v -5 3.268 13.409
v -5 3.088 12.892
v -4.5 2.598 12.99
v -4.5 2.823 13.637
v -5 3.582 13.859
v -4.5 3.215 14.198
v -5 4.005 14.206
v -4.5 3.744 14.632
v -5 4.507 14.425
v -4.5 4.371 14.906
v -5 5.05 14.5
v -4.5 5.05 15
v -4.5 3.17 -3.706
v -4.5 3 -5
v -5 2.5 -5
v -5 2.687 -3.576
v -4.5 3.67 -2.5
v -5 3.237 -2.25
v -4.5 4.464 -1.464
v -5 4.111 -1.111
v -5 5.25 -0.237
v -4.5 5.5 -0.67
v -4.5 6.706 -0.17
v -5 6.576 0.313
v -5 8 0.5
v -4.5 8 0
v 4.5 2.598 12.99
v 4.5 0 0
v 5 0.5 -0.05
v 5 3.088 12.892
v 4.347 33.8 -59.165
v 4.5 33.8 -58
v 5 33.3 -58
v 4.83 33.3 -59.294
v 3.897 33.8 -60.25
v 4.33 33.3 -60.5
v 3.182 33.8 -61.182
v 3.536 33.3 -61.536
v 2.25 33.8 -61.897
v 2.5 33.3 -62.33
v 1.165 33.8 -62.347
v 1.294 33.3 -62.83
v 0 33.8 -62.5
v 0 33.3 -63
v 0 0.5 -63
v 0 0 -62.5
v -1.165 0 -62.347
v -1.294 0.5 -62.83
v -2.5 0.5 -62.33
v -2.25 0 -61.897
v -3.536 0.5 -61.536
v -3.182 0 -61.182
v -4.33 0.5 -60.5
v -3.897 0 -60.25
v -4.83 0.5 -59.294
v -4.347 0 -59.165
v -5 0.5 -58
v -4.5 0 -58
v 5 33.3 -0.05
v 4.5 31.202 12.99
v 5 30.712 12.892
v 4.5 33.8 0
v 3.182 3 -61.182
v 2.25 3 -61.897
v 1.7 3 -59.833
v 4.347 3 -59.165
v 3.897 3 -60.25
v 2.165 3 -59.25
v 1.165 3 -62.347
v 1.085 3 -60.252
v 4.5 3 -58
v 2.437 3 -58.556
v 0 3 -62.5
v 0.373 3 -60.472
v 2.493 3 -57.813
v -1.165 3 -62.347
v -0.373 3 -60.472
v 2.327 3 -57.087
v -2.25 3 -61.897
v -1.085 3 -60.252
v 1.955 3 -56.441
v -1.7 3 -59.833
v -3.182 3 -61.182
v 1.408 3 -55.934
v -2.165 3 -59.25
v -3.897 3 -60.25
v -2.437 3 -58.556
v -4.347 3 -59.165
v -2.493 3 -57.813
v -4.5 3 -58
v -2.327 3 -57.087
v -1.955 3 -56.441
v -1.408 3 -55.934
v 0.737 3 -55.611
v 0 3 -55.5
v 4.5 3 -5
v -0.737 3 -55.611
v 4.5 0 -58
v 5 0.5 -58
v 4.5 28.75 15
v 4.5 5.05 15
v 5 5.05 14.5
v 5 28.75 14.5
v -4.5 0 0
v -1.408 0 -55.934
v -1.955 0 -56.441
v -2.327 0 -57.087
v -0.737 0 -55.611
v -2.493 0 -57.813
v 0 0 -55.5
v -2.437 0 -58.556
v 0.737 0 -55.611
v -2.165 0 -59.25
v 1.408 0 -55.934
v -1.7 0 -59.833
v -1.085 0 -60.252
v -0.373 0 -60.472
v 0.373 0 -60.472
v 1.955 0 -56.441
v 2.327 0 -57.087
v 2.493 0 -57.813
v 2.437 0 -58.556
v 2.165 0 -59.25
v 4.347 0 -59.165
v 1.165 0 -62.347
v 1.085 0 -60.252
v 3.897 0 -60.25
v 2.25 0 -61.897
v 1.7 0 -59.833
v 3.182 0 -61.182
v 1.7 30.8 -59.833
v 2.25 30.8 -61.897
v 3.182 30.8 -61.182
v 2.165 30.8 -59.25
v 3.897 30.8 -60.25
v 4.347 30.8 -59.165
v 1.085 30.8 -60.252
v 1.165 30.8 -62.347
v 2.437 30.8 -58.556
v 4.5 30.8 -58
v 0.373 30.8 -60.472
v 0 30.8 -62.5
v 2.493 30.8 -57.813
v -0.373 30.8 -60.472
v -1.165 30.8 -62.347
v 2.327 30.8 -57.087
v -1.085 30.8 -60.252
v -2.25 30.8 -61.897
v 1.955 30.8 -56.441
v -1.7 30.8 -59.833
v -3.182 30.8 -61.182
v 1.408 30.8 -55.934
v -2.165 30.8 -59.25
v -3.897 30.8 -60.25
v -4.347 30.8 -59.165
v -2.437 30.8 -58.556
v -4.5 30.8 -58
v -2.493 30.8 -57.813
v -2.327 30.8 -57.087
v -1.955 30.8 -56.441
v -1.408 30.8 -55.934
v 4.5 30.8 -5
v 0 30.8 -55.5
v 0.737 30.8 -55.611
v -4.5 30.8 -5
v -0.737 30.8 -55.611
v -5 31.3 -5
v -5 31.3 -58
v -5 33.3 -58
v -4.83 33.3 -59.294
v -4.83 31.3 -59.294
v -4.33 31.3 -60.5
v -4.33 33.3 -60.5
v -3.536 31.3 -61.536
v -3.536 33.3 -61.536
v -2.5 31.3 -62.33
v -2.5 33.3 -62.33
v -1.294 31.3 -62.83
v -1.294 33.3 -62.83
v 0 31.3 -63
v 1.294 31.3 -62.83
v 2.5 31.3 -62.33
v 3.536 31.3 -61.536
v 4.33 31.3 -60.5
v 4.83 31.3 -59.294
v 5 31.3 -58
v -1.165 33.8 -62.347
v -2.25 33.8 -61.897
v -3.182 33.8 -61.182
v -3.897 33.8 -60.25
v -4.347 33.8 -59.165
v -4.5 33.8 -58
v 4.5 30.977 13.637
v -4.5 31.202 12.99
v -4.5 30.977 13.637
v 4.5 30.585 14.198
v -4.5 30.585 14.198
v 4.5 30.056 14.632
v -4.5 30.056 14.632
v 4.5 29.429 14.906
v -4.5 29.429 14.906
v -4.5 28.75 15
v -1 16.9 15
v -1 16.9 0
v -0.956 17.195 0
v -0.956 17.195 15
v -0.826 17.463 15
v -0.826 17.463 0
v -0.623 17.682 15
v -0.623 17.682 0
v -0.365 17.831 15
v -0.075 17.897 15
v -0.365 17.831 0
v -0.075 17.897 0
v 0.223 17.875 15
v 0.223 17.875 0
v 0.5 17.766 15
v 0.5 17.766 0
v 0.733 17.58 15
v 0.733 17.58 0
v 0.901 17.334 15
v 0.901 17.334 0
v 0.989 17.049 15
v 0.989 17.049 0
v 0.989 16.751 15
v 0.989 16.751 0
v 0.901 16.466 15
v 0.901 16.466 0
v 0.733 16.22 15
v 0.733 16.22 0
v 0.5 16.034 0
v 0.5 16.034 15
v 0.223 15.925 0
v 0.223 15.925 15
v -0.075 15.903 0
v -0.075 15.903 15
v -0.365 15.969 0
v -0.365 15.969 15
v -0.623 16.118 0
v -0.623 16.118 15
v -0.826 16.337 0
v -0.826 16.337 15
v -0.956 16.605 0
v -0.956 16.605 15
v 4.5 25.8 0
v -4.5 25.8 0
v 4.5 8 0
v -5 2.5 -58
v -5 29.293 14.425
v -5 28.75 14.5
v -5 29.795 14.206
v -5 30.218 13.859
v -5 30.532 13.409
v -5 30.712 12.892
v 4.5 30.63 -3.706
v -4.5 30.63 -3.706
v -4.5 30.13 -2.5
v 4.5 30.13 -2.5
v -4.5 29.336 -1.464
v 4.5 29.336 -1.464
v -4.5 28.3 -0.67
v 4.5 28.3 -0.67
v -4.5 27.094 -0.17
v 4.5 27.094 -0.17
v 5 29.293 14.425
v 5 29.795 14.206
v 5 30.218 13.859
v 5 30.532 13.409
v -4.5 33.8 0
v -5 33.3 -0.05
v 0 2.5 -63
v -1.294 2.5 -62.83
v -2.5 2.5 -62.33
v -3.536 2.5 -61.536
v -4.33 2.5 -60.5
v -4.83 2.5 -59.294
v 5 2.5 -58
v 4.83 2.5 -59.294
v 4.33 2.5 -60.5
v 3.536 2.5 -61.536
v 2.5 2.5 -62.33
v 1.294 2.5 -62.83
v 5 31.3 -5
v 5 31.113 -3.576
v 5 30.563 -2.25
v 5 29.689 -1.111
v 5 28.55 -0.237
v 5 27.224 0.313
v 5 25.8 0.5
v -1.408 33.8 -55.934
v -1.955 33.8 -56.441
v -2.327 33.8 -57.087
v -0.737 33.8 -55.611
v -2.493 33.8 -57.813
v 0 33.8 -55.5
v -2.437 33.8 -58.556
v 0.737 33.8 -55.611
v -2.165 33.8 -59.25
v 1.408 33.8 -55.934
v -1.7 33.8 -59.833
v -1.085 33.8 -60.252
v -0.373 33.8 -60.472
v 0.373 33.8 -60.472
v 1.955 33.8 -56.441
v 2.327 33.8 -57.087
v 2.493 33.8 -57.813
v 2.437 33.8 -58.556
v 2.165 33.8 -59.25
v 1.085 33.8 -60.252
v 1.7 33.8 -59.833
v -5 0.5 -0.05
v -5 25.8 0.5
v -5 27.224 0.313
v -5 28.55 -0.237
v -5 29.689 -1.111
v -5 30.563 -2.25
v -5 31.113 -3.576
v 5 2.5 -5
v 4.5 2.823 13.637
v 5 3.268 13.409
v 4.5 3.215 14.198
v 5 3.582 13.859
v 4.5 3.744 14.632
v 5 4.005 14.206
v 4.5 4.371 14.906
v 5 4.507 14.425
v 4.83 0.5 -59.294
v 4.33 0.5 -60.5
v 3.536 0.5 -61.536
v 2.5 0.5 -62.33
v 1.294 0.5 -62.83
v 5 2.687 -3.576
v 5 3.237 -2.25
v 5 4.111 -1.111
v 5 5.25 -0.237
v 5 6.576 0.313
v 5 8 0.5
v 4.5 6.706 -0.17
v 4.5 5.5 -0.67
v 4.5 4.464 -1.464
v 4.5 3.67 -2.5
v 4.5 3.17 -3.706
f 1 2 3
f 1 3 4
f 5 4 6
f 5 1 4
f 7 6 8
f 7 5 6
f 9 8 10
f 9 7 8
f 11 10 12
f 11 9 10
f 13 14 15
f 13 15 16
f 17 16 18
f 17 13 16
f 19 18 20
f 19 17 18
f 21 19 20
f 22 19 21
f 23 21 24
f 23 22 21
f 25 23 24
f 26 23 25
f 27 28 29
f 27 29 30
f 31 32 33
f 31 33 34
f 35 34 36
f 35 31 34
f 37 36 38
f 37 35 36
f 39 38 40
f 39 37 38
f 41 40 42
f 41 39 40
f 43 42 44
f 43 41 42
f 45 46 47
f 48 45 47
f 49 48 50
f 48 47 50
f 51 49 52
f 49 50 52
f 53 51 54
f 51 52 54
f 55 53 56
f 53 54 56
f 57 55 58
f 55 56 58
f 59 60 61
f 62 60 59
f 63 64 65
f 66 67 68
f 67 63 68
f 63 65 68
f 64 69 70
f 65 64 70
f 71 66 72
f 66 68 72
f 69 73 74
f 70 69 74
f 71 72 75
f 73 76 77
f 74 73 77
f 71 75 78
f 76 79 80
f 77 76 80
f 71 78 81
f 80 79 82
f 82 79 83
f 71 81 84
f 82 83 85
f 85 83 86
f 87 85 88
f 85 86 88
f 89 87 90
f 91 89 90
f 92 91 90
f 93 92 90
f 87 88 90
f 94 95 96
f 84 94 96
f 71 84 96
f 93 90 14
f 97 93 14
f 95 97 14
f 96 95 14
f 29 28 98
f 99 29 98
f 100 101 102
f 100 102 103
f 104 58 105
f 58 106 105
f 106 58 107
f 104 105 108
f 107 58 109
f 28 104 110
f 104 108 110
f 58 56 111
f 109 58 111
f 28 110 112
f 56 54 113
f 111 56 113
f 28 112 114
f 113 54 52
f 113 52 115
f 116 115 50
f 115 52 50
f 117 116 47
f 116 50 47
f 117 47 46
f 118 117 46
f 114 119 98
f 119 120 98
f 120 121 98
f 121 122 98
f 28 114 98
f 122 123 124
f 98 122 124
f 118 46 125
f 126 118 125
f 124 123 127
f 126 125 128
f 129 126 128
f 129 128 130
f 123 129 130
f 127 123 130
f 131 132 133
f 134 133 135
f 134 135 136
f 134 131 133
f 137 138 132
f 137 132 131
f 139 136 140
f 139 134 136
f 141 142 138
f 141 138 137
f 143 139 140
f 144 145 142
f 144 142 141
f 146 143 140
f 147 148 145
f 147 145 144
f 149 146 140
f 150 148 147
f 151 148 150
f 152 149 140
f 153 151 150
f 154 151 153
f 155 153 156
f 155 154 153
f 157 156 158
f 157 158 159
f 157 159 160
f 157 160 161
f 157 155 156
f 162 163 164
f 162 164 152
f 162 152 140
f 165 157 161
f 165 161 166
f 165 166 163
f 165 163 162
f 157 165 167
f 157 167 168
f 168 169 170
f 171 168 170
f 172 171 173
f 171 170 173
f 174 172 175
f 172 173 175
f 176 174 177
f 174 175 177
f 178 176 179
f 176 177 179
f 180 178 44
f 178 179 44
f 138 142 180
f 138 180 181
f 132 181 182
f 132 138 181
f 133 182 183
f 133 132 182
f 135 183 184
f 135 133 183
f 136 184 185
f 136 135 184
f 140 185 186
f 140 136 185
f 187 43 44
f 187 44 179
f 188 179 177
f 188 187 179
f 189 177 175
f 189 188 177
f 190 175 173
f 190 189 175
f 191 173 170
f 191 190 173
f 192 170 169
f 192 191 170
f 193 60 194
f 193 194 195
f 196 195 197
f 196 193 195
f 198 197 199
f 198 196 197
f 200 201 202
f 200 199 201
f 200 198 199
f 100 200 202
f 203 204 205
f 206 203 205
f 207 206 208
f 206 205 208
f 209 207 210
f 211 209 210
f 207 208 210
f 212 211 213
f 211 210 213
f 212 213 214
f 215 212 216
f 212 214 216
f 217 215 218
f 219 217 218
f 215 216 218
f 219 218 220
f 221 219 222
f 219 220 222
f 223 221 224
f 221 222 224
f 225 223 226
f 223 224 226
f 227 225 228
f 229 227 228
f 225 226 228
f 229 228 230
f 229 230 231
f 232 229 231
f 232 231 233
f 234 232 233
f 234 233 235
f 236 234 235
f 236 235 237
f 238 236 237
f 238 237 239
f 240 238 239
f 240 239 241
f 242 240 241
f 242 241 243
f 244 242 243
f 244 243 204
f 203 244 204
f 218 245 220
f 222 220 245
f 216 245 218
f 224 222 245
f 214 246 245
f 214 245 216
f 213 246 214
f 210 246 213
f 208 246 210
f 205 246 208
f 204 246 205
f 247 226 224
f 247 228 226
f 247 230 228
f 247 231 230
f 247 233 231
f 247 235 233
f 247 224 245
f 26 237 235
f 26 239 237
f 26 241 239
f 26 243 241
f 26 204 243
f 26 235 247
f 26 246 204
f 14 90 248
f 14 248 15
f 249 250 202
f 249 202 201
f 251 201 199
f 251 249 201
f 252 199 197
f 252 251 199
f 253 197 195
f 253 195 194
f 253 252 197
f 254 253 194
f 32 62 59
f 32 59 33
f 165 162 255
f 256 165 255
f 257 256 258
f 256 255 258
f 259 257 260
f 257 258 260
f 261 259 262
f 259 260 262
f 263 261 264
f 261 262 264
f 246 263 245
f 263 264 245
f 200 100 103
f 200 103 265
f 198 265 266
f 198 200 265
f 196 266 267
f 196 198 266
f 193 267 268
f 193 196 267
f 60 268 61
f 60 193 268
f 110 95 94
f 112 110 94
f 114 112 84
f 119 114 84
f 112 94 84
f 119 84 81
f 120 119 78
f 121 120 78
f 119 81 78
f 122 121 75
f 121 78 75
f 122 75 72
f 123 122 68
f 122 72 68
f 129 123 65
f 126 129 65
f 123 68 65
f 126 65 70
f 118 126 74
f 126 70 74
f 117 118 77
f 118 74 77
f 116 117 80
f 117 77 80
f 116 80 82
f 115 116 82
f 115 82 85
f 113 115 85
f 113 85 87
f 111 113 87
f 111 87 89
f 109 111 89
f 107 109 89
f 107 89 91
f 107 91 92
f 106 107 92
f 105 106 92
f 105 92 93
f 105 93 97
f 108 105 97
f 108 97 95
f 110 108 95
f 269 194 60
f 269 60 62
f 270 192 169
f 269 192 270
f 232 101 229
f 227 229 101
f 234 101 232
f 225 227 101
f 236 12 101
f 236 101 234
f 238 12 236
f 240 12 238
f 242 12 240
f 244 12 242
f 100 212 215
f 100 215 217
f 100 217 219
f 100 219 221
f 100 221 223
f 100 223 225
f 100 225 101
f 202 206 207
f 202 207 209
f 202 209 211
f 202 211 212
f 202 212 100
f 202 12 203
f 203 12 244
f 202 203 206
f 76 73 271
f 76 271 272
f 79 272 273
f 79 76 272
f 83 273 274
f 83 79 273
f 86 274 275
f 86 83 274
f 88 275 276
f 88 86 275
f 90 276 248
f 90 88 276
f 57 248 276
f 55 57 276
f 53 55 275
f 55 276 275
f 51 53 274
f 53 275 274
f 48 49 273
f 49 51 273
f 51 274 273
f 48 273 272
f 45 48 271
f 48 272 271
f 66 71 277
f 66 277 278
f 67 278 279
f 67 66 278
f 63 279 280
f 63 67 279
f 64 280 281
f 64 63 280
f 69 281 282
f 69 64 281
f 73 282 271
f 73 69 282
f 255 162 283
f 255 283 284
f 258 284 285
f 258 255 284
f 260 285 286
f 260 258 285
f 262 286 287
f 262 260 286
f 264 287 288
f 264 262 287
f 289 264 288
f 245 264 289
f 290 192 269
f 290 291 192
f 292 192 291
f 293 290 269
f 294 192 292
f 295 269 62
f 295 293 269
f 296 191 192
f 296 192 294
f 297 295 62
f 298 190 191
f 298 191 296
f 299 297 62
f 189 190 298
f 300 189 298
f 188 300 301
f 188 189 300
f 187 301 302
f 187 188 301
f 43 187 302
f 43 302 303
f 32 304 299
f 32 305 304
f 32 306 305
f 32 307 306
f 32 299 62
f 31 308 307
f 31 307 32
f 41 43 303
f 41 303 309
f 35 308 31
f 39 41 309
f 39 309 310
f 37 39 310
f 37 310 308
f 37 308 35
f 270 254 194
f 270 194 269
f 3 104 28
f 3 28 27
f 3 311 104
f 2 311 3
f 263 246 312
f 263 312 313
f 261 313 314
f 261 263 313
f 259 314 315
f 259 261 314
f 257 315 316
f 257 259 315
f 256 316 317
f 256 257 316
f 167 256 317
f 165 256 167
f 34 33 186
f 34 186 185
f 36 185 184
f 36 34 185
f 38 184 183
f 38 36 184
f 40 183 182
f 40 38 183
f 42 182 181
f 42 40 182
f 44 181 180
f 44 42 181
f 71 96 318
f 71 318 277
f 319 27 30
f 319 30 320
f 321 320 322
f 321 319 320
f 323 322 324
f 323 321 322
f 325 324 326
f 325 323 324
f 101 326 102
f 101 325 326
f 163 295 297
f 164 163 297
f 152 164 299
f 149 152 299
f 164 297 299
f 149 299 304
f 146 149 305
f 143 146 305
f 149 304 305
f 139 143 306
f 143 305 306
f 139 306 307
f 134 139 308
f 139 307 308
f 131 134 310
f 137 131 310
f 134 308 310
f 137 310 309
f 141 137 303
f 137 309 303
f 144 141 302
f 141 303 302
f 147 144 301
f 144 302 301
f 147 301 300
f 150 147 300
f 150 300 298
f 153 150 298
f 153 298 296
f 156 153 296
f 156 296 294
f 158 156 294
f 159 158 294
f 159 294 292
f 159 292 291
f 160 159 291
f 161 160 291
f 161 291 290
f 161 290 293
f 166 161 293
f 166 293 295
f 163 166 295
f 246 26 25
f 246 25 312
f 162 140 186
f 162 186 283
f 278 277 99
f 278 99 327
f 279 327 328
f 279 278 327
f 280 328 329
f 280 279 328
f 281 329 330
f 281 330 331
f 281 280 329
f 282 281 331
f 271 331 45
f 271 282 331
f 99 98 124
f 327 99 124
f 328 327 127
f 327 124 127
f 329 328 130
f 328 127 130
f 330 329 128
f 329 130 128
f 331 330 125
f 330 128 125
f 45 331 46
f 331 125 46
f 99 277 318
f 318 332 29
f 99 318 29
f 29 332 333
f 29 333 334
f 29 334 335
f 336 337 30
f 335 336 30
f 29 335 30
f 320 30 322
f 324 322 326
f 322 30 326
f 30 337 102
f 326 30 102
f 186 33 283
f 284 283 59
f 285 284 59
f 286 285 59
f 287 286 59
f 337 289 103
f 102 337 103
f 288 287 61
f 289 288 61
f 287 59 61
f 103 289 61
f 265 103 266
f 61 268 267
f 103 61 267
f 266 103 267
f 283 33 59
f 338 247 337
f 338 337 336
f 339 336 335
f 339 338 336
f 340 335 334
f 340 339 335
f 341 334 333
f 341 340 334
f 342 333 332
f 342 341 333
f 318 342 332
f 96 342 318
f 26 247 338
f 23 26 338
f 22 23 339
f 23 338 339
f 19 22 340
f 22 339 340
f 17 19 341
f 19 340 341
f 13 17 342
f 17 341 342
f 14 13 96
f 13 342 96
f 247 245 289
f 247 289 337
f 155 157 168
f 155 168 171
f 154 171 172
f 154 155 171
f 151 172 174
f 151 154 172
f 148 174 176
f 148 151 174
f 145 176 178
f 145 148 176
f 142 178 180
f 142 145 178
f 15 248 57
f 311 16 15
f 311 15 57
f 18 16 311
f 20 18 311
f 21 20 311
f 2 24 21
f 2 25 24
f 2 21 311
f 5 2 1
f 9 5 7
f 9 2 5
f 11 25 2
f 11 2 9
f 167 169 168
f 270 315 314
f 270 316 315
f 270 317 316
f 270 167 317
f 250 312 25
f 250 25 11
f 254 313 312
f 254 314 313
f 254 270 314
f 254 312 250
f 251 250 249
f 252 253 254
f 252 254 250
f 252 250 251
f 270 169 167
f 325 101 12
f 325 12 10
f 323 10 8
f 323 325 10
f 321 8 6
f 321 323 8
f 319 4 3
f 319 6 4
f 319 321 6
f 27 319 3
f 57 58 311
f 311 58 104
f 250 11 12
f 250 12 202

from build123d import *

# Parameters (mm, degrees)
EXTRUDE_2_DEPTH     = 33.8
SKETCH_2_W          = 63
SKETCH_2_H          = 27.8
CUT_EXTRUDE_2_DEPTH = 73.190304058
SKETCH_4_W          = 15
SKETCH_4_H          = 13.9
EXTRUDE_4_DEPTH     = 10
FILLET_1_R          = 5
FILLET_2_R          = 5
FILLET_3_R          = 2.5
SKETCH_5_R          = 2.5
CUT_EXTRUDE_3_DEPTH = 72.668961204
SKETCH_6_R          = 1
CUT_EXTRUDE_4_DEPTH = 72.668961204
CHAMFER_2_SIZE      = 0.5


with BuildPart() as part:
    # ｽｹｯﾁ1 → ﾎﾞｽ - 押し出し2 (new body)
    with BuildSketch(Plane(origin=(0, 0, 0), x_dir=(1, 0, 0), z_dir=(0, 1, 0))):
        with BuildLine():
            Line((-5, 0), (0, 0))
            Line((0, 0), (0, 58))
            Line((0, 58), (0, 63))
            ThreePointArc((0, 63), (-3.535533906, 61.535533906), (-5, 58))
            Line((-5, 58), (-5, 0))
        make_face()
        with BuildLine():
            Line((0, 58), (0, 0))
            Line((0, 0), (5, 0))
            Line((5, 0), (5, 58))
            ThreePointArc((5, 58), (3.535533906, 61.535533906), (0, 63))
            Line((0, 63), (0, 58))
        make_face()
        with BuildLine():
            ThreePointArc((-5, 58), (-3.535533906, 61.535533906), (0, 63))
            Line((0, 63), (-5, 63))
            Line((-5, 63), (-5, 58))
        make_face()
        with BuildLine():
            Line((5, 63), (0, 63))
            ThreePointArc((0, 63), (3.535533906, 61.535533906), (5, 58))
            Line((5, 58), (5, 63))
        make_face()
    extrude(amount=EXTRUDE_2_DEPTH)

    # ｽｹｯﾁ2 → ｶｯﾄ - 押し出し2 (cut, through all)
    with BuildSketch(Plane.ZY.offset(5)):
        with Locations((-31.5, 16.9)):
            Rectangle(SKETCH_2_W, SKETCH_2_H)
    extrude(amount=-CUT_EXTRUDE_2_DEPTH, mode=Mode.SUBTRACT)


with BuildPart() as cut_extrude_2_piece_1:
    # of the separate pieces the step leaves, piece 1, a body of its own (cut_extrude_2_pieces)
    add(part.part.solids().sort_by_distance((-5, 30.8, 0))[0])



with BuildPart() as cut_extrude_2_piece_2:
    # of the separate pieces the step leaves, piece 2, a body of its own (cut_extrude_2_pieces)
    add(part.part.solids().sort_by_distance((-5, 0, 0))[0])


with BuildPart() as cut_extrude_2_piece_1_1:
    add(cut_extrude_2_piece_1.part)

    add(cut_extrude_2_piece_2.part)  # ﾎﾞｽ - 押し出し4 merges ｶｯﾄ - 押し出し2 piece 2
    # ｽｹｯﾁ4 → ﾎﾞｽ - 押し出し4 (add)
    with BuildSketch(Plane.ZY.offset(5)):
        Polygon((0, 3), (0, 0), (15, 3), align=None)
        with Locations((7.5, 9.95)):
            Rectangle(SKETCH_4_W, SKETCH_4_H)
        with Locations((7.5, 23.85)):
            Rectangle(SKETCH_4_W, SKETCH_4_H)
        Polygon((0, 33.8), (0, 30.8), (15, 30.8), align=None)
    extrude(amount=-EXTRUDE_4_DEPTH)

    # ﾌｨﾚｯﾄ1
    fillet_1_edges = [cut_extrude_2_piece_1_1.edges().sort_by_distance(p)[0] for p in [
        (5, 1.5, -63),
        (-5, 1.5, -63),
        (5, 32.3, -63),
        (-5, 32.3, -63),
    ]]
    fillet(fillet_1_edges, radius=FILLET_1_R - 0.0001)  # a hair under: the kernel refuses the full size

    # ﾌｨﾚｯﾄ2
    fillet_2_edges = [cut_extrude_2_piece_1_1.edges().sort_by_distance(p)[0] for p in [
        (0, 30.8, 0),
        (0, 3, 0),
    ]]
    fillet(fillet_2_edges, radius=FILLET_2_R)

    # ﾌｨﾚｯﾄ3
    fillet_3_edges = [cut_extrude_2_piece_1_1.edges().sort_by_distance(p)[0] for p in [
        (0, 30.8, 15),
        (0, 3, 15),
    ]]
    fillet(fillet_3_edges, radius=FILLET_3_R)

    # ｽｹｯﾁ5 → ｶｯﾄ - 押し出し3 (cut, through all)
    with BuildSketch(Plane(origin=(0, 33.8, 0), x_dir=(1, 0, 0), z_dir=(0, 1, 0))):
        with Locations(Location((0, 58, 0), (0, 0, 270))):
            Circle(SKETCH_5_R)
    extrude(amount=-CUT_EXTRUDE_3_DEPTH, mode=Mode.SUBTRACT)

    # ｽｹｯﾁ6 → ｶｯﾄ - 押し出し4 (cut, through all)
    with BuildSketch(Plane(origin=(0, 0, 0), x_dir=(-1, 0, 0), z_dir=(0, 0, -1))):
        with Locations((0, 16.9)):
            Circle(SKETCH_6_R)
    extrude(amount=-CUT_EXTRUDE_4_DEPTH, mode=Mode.SUBTRACT)

    # 面取り2
    chamfer_2_edges = [cut_extrude_2_piece_1_1.edges().sort_by_distance(p)[0] for p in [
        (-5, 1.299029034, 6.495145169),
        (5, 32.500970966, 6.495145169),
        (5, 33.8, -29.00005),
        (5, 0, -29.00005),
        (-5, 0, -29.00005),
        (-3.535563195, 0, -61.535563195),
        (3.535563195, 0, -61.535563195),
        (5, 30.8, -31.50005),
        (5, 3, -31.50005),
        (-5, 3, -31.50005),
        (-3.535563195, 3, -61.535563195),
        (3.535563195, 3, -61.535563195),
        (-5, 30.8, -31.50005),
        (-5, 33.8, -29.00005),
        (-3.535563195, 30.8, -61.535563195),
        (3.535563195, 30.8, -61.535563195),
        (-3.535563195, 33.8, -61.535563195),
        (3.535563195, 33.8, -61.535563195),
        (-5, 16.9, 0),
        (5, 16.9, 0),
        (-5, 29.335533906, -1.464466094),
        (5, 29.335533906, -1.464466094),
        (-5, 4.464466094, -1.464466094),
        (5, 4.464466094, -1.464466094),
        (5, 16.9, 15),
        (-5, 16.9, 15),
        (-5, 32.500970966, 6.495145169),
        (-5, 3.464537493, 14.433355353),
        (-5, 30.335462507, 14.433355353),
        (5, 1.299029034, 6.495145169),
        (5, 3.464537493, 14.433355353),
        (5, 30.335462507, 14.433355353),
    ]]
    chamfer(chamfer_2_edges, length=CHAMFER_2_SIZE)


solid = cut_extrude_2_piece_1_1.part
